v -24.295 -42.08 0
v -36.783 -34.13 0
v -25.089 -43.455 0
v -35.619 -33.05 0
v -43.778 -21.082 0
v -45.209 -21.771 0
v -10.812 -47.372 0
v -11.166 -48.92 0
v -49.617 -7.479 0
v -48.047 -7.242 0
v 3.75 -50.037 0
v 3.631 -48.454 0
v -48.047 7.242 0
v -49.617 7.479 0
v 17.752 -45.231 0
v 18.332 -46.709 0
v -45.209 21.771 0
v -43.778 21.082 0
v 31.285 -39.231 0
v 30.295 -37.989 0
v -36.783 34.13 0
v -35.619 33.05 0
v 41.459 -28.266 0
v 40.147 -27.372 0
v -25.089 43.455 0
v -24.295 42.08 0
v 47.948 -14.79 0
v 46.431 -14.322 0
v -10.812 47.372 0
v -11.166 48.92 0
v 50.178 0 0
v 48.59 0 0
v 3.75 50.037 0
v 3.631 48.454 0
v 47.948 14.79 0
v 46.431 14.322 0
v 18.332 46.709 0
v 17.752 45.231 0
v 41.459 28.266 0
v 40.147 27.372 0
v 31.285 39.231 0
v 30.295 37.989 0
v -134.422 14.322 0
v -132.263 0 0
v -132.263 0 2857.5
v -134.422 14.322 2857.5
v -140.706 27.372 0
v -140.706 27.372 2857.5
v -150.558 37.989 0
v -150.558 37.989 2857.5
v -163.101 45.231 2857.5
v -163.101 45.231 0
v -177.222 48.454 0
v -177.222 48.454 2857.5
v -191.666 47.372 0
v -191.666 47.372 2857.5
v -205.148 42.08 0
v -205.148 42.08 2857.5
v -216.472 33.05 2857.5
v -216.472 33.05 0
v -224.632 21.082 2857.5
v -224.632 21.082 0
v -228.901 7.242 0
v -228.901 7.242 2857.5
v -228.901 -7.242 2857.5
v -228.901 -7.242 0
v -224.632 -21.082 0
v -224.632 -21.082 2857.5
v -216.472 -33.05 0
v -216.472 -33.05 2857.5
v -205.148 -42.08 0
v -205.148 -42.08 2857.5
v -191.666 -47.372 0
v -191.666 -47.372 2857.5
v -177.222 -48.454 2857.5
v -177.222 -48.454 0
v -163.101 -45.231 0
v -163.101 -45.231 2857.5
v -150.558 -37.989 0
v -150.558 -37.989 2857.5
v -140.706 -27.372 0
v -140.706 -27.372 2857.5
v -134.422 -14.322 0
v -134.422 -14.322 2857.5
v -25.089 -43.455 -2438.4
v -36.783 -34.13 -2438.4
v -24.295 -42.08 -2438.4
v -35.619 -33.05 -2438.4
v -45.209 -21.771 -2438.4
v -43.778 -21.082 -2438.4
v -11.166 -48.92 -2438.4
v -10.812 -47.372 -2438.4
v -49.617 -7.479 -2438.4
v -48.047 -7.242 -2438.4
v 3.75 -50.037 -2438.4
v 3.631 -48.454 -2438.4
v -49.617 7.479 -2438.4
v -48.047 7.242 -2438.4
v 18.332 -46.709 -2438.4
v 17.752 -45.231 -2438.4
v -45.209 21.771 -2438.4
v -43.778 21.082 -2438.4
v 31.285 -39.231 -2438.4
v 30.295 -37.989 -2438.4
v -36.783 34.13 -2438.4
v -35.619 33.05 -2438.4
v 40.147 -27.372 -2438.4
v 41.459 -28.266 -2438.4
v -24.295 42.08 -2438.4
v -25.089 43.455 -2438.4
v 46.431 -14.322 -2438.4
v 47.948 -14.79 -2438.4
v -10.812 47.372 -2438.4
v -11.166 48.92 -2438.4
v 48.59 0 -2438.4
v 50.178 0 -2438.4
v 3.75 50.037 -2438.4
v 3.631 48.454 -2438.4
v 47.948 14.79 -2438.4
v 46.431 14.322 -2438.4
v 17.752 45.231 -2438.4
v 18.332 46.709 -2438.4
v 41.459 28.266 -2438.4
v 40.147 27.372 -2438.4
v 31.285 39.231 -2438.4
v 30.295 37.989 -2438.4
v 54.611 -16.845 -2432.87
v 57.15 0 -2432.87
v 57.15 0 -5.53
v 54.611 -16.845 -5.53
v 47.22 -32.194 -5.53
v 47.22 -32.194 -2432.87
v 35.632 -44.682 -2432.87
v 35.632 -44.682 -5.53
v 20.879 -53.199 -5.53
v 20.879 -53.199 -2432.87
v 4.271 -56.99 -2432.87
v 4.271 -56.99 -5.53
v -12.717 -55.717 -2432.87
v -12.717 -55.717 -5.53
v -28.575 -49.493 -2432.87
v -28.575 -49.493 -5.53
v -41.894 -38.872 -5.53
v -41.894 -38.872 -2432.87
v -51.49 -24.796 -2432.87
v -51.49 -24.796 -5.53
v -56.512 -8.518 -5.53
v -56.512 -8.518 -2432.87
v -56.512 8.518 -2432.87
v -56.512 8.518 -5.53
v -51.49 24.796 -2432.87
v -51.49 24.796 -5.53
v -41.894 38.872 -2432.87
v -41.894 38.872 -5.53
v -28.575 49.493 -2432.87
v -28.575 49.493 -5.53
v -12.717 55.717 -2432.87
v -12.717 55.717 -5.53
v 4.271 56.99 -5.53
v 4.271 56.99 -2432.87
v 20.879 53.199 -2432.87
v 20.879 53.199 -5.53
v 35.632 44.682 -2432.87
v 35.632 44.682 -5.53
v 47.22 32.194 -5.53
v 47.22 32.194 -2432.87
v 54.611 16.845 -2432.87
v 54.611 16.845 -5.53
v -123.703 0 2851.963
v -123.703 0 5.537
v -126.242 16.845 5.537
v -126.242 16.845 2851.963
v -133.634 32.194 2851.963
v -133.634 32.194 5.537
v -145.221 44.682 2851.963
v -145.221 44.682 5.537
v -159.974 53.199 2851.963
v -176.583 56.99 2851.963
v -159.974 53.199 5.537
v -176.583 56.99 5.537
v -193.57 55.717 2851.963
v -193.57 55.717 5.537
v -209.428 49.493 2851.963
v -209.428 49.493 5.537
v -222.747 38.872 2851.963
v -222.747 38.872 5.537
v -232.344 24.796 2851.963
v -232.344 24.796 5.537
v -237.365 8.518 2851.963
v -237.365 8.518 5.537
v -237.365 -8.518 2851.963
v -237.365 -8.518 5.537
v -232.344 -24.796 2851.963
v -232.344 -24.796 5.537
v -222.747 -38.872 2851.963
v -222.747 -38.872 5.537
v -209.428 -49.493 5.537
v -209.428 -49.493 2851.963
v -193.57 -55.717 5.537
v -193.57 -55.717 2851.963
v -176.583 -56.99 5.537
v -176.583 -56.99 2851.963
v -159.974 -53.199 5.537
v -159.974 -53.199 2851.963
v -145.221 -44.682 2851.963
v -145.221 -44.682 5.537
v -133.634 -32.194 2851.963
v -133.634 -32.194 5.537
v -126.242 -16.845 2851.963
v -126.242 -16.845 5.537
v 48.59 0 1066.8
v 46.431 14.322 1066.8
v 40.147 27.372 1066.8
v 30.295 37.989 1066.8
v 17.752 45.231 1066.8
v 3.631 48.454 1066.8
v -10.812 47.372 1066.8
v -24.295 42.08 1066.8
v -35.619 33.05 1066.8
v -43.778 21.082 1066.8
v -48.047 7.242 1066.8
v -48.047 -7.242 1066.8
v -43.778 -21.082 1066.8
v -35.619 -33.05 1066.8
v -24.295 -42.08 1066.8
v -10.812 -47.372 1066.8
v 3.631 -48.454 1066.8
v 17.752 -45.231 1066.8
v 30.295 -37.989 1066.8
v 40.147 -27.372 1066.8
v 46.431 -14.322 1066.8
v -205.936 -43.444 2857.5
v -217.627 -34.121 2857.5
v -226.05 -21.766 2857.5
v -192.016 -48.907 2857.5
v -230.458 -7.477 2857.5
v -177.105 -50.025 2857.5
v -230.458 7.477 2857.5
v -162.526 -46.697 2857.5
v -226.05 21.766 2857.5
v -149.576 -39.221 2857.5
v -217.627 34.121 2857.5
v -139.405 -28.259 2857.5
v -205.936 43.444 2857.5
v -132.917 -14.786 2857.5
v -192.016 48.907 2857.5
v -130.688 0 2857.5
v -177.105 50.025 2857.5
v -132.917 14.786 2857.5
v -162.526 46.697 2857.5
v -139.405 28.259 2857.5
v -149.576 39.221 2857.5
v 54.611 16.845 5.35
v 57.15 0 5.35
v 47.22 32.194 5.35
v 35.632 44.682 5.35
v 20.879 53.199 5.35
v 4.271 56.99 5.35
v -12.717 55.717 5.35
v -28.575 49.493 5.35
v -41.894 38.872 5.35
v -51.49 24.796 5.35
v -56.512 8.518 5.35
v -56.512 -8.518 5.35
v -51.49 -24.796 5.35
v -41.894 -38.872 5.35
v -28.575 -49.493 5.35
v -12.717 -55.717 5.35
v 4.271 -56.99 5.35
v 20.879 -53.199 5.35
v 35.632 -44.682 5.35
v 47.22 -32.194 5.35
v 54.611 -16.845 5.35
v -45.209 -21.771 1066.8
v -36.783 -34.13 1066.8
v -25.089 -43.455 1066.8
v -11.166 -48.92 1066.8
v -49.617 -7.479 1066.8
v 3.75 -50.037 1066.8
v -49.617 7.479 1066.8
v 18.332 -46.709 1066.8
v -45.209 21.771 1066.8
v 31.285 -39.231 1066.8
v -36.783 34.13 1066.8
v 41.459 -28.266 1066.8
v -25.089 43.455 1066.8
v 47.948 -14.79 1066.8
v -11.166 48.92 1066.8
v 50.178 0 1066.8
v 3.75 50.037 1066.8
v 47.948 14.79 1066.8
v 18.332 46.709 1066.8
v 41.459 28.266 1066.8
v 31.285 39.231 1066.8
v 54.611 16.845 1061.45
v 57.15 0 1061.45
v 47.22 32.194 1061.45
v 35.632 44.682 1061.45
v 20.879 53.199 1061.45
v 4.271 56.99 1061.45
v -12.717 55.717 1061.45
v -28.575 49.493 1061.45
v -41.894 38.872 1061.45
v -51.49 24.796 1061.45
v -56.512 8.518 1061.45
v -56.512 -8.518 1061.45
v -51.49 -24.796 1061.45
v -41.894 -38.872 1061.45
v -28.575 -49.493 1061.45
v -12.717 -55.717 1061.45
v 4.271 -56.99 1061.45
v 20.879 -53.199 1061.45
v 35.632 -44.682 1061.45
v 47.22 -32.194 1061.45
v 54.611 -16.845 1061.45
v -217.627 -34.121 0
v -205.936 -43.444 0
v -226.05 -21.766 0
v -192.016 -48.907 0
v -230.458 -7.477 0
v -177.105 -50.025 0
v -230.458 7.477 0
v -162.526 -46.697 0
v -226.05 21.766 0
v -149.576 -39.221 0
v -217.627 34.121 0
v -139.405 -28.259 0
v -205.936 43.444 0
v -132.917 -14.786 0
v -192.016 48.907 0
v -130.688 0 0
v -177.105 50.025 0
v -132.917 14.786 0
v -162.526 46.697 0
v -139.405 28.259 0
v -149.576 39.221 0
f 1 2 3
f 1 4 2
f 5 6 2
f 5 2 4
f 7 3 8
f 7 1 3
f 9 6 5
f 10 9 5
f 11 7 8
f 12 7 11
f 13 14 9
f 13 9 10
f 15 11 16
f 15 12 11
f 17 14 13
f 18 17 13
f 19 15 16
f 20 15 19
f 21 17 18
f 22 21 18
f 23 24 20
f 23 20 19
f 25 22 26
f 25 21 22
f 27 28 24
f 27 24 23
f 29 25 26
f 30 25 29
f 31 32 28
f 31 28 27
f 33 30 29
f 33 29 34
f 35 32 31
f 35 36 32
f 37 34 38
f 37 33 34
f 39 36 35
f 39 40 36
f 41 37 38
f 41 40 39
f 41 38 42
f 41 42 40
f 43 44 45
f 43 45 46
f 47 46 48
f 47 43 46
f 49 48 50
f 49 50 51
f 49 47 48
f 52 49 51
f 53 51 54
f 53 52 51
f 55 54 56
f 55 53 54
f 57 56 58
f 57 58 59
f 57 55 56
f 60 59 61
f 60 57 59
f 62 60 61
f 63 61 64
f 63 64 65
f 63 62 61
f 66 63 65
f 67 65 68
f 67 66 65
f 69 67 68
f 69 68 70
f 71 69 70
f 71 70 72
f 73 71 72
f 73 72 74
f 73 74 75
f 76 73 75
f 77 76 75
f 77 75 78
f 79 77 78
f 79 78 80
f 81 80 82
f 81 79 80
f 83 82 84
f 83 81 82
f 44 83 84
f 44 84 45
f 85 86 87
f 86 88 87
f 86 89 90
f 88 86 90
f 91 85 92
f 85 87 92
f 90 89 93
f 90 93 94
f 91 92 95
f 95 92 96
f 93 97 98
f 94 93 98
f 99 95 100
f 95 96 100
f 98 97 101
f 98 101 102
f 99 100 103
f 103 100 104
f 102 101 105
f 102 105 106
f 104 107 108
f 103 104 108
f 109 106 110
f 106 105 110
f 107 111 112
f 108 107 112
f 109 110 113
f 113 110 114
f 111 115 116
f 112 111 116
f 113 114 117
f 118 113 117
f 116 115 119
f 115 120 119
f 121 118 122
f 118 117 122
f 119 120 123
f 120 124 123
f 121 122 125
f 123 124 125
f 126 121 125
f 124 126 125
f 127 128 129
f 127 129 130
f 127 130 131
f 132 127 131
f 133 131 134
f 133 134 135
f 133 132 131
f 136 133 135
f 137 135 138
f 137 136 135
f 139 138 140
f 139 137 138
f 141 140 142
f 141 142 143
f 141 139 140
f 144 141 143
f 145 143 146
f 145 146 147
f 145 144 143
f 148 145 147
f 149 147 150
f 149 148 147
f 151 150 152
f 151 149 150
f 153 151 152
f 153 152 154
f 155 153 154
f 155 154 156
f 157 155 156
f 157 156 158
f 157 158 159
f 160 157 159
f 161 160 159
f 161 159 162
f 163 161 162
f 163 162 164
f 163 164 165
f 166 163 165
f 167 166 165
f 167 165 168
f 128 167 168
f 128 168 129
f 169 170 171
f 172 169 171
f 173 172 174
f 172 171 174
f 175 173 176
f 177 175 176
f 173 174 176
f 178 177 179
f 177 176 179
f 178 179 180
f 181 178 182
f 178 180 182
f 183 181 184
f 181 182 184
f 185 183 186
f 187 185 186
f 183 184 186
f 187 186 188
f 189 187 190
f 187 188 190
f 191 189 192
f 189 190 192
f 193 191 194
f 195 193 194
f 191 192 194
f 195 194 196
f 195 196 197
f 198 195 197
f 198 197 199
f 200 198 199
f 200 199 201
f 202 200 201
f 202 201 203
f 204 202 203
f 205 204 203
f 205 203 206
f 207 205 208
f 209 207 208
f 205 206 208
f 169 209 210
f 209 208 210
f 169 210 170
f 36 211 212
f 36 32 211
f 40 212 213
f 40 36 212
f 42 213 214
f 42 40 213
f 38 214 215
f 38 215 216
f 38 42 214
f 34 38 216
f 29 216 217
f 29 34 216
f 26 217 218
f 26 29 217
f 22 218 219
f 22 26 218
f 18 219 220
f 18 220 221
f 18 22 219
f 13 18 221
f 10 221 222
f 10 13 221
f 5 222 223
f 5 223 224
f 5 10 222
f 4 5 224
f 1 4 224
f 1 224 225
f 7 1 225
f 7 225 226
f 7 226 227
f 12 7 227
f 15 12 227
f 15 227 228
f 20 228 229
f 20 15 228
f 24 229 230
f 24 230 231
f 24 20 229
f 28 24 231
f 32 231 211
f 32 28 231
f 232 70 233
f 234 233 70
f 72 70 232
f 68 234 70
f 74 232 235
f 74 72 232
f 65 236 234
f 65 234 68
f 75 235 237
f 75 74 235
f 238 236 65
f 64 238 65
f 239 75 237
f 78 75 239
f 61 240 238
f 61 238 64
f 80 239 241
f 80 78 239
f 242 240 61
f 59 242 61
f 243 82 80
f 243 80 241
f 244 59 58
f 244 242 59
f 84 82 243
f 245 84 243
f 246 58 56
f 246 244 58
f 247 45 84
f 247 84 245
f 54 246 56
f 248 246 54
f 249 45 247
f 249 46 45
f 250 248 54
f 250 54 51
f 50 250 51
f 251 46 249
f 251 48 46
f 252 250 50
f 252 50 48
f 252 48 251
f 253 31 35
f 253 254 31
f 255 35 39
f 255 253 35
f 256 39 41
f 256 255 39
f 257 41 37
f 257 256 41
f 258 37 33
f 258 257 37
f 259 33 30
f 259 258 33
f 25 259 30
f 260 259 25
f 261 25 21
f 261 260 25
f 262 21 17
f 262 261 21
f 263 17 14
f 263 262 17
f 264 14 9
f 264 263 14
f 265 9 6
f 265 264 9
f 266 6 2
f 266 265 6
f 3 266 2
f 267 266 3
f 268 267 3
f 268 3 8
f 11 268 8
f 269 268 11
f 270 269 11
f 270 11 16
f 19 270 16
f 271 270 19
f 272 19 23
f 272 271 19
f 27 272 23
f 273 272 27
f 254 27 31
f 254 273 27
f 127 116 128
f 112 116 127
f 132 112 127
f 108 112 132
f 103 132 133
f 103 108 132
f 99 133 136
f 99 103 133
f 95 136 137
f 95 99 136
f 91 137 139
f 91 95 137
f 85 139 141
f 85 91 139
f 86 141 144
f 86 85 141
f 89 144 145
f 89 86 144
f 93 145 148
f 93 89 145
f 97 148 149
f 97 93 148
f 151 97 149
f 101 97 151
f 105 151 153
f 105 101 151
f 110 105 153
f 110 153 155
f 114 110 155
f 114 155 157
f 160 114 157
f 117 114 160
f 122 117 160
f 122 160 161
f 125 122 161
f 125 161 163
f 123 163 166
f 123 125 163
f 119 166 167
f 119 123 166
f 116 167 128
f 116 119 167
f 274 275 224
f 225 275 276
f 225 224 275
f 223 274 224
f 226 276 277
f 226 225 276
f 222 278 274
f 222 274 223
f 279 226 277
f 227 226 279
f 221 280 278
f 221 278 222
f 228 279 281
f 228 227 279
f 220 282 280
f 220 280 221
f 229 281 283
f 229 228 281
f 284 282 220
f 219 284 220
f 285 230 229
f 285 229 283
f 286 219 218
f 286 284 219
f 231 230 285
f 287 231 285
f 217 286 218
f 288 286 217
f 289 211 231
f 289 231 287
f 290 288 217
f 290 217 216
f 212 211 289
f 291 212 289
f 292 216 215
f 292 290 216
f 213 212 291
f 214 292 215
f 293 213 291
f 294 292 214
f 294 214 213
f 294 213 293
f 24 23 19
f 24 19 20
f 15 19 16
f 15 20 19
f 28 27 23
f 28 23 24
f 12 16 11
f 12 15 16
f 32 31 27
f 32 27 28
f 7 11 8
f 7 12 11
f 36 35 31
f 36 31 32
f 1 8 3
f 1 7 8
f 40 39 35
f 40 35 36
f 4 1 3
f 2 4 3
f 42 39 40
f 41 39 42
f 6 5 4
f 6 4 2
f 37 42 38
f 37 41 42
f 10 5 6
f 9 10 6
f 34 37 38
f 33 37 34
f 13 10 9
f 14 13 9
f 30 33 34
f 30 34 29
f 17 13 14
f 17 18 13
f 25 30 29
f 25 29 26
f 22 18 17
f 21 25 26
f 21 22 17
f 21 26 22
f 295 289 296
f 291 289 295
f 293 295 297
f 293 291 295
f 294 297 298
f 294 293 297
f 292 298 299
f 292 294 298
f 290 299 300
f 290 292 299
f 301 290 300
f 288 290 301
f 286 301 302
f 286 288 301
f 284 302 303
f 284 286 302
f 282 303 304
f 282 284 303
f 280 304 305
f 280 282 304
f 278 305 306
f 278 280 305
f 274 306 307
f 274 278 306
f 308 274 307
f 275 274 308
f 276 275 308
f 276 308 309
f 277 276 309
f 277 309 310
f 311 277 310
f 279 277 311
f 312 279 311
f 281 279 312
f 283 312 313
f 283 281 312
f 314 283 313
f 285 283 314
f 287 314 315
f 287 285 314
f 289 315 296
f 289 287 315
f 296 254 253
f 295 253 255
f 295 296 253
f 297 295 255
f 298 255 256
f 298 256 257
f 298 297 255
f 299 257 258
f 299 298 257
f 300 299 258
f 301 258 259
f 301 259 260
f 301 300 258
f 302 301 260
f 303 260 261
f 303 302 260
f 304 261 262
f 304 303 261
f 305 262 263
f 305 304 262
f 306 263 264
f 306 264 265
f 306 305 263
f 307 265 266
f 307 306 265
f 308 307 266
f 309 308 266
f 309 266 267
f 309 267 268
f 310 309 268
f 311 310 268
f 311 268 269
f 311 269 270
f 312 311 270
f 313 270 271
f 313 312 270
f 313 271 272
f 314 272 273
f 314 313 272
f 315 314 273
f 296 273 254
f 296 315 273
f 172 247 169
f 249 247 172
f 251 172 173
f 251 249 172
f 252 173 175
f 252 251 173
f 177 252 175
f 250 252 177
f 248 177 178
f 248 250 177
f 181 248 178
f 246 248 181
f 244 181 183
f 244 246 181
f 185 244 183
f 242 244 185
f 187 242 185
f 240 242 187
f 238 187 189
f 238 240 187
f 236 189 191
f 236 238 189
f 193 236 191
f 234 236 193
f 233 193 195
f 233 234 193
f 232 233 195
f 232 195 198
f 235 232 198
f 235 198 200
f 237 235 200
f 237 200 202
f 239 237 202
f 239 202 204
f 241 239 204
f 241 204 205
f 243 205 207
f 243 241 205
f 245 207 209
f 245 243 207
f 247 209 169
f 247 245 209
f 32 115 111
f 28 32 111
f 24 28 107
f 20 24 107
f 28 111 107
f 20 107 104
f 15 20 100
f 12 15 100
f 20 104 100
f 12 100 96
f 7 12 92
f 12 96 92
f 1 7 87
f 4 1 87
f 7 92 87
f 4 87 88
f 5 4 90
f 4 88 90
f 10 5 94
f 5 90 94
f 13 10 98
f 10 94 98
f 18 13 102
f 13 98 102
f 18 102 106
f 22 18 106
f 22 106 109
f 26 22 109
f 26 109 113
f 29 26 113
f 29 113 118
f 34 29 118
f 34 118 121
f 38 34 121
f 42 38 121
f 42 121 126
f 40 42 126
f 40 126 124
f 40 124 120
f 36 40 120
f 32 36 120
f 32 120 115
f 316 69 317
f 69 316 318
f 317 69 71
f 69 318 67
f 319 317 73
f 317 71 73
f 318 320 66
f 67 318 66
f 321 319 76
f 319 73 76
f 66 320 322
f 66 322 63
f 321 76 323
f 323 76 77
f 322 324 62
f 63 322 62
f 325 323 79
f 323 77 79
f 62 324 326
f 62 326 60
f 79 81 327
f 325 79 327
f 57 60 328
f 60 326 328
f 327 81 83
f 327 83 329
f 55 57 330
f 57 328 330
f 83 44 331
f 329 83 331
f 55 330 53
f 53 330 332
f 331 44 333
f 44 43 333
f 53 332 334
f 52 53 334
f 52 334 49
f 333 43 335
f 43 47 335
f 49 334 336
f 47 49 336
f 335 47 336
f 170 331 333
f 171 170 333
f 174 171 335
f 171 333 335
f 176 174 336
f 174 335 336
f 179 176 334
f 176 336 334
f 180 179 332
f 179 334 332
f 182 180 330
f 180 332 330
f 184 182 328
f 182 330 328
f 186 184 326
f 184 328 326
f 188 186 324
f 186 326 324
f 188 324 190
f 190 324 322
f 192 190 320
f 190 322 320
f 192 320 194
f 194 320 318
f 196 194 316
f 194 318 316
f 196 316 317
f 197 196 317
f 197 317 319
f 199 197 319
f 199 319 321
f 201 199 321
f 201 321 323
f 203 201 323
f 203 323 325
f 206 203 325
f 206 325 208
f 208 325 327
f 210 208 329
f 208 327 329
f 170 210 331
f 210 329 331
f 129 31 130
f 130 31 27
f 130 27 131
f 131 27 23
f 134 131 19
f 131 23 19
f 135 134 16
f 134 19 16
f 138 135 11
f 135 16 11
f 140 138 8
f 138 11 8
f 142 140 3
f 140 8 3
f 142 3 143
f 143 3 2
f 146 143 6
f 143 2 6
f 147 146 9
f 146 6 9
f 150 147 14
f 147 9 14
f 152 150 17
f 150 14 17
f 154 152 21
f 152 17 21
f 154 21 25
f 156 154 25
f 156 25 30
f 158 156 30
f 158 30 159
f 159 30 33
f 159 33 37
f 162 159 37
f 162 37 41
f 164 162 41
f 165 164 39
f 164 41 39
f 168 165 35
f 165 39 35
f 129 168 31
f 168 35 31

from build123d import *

# Parameters (mm, degrees)
F2_R     = 57.15
F2_R_2   = 50.1777
F2_R_3   = 48.5902
F5_SIZE2 = 6.9723
F5_SIZE  = 5.52958
F6_SIZE2 = 6.9723
F6_SIZE  = 5.52958
F7_R     = 57.15
F7_R_2   = 48.5902
F8_DEPTH = 2857.5
F9_SIZE2 = 6.985
F9_SIZE  = 5.5372


with BuildPart() as f1:
    # F0 (on Front) → F1 (revolve)
    with BuildSketch(Plane.XZ):
        Polygon((50.1777, 0), (57.15, 5.3500339583), (57.15, 1061.4499660417), (50.1777, 1066.8), (48.5902, 1066.8), (48.5902, 0), align=None)
    revolve(axis=Axis((0, 0, 533.4), (0, 0, 1)))


with BuildPart() as f4:
    # F4: sweep along a path in F3
    with BuildLine(Plane.XZ) as f4_path:
        Line((0, 0), (0, -2438.4))
    # F2 (on Top) → F4 (sweep)
    with BuildSketch(Plane.XY):
        Circle(F2_R)
        Circle(F2_R_2, mode=Mode.SUBTRACT)
        Circle(F2_R_2)
        Circle(F2_R_3, mode=Mode.SUBTRACT)
    sweep(path=f4_path.line)

    # F5
    f5_edges = [f4.edges().sort_by_distance(p)[0] for p in [
        (-57.15, 0, -2438.4),
    ]]
    f5_side = f4.faces().sort_by_distance((-57.15, 0, -1219.2))[0]
    chamfer(f5_edges, length=F5_SIZE, length2=F5_SIZE2, reference=f5_side)

    # F6
    f6_edges = [f4.edges().sort_by_distance(p)[0] for p in [
        (-57.15, 0, 0),
    ]]
    f6_side = f4.faces().sort_by_distance((-57.15, 0, -1216.43521))[0]
    chamfer(f6_edges, length=F6_SIZE, length2=F6_SIZE2, reference=f6_side)


with BuildPart() as f8:
    # F7 (on Top) → F8 (new body)
    with BuildSketch(Plane.XY):
        with Locations((-180.8533519506, 0)):
            Circle(F7_R)
        with Locations((-180.8533519506, 0)):
            Circle(F7_R_2, mode=Mode.SUBTRACT)
    extrude(amount=F8_DEPTH)

    # F9
    f9_edges = [f8.edges().sort_by_distance(p)[0] for p in [
        (-238.003352, 0, 0),
        (-238.003352, 0, 2857.5),
    ]]
    f9_side = f8.faces().sort_by_distance((-238.003352, 0, 1428.75))[0]
    chamfer(f9_edges, length=F9_SIZE, length2=F9_SIZE2, reference=f9_side)


solid = Compound([f1.part, f4.part, f8.part])
